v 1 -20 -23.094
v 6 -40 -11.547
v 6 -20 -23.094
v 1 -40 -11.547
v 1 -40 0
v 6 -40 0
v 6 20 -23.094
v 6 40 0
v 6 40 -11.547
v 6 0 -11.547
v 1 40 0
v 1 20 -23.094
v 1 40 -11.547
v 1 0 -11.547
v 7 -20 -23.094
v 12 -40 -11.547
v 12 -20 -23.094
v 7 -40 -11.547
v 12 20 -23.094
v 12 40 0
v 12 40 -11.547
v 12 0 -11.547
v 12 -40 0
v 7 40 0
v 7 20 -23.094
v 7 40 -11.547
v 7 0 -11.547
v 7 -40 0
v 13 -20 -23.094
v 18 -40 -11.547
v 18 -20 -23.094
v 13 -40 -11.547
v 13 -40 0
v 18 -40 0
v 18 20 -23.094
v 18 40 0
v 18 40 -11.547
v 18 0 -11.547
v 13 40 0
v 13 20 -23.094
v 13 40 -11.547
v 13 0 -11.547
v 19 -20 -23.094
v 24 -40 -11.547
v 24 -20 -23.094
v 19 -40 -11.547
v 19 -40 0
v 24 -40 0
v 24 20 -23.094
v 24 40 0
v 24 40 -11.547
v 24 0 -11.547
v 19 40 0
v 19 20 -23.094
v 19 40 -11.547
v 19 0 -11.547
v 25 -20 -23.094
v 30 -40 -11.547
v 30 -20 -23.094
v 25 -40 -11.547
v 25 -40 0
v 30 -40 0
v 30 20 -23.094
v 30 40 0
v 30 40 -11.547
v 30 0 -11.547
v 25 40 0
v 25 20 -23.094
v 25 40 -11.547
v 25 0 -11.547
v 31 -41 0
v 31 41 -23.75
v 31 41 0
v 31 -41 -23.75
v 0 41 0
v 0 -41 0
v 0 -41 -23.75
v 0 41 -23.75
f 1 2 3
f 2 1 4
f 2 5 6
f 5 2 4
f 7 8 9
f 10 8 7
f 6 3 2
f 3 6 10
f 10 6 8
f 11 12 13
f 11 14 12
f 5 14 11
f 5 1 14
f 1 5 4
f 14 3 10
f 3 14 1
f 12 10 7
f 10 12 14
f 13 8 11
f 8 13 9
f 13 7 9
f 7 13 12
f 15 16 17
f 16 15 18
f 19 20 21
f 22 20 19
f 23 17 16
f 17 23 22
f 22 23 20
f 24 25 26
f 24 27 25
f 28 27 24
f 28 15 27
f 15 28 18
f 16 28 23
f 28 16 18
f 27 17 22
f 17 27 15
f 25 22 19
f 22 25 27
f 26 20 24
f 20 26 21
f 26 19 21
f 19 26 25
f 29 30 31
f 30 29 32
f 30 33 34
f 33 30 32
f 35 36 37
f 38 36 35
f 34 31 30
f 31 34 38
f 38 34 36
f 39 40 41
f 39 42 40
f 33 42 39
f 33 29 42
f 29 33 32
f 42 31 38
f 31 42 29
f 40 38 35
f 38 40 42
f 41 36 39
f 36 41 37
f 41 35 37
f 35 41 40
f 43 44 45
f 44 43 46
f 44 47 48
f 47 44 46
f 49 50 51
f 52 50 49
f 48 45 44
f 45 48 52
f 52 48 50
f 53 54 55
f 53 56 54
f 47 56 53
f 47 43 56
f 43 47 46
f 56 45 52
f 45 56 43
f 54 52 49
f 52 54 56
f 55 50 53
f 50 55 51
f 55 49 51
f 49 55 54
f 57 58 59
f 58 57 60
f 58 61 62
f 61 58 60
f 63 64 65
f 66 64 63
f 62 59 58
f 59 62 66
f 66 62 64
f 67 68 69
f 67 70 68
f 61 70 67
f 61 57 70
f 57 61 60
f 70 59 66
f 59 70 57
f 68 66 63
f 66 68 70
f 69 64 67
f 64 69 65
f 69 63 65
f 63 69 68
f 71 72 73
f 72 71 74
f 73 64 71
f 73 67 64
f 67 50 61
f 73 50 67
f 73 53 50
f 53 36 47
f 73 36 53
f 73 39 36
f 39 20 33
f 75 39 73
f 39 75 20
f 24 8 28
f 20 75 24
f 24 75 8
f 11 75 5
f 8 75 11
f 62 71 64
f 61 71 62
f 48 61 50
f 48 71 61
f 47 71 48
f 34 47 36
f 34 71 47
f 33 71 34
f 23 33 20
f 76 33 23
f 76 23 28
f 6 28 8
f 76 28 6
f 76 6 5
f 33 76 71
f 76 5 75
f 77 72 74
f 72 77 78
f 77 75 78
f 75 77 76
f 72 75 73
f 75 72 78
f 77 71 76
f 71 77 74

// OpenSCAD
include <18xx tiles basic functions.scad>
// 5 pcs means 31 mm long
hexes=5;

yt=hex_size+3*width;
zt=1.25*hex_size;
difference() {
    translate([0,-2*yt,-zt]) cube([hexes*6+1,4*yt,zt]);
    for(i=[0:(hexes-1)]){
            translate([1+i*6,-yt+width,0]) rotate([0,90,0]) linear_extrude(5) regular_polygon(6,hex_size+2*width);
            translate([1+i*6,+yt-width,0]) rotate([0,90,0]) linear_extrude(5) regular_polygon(6,hex_size+2*width);
    }
}    
